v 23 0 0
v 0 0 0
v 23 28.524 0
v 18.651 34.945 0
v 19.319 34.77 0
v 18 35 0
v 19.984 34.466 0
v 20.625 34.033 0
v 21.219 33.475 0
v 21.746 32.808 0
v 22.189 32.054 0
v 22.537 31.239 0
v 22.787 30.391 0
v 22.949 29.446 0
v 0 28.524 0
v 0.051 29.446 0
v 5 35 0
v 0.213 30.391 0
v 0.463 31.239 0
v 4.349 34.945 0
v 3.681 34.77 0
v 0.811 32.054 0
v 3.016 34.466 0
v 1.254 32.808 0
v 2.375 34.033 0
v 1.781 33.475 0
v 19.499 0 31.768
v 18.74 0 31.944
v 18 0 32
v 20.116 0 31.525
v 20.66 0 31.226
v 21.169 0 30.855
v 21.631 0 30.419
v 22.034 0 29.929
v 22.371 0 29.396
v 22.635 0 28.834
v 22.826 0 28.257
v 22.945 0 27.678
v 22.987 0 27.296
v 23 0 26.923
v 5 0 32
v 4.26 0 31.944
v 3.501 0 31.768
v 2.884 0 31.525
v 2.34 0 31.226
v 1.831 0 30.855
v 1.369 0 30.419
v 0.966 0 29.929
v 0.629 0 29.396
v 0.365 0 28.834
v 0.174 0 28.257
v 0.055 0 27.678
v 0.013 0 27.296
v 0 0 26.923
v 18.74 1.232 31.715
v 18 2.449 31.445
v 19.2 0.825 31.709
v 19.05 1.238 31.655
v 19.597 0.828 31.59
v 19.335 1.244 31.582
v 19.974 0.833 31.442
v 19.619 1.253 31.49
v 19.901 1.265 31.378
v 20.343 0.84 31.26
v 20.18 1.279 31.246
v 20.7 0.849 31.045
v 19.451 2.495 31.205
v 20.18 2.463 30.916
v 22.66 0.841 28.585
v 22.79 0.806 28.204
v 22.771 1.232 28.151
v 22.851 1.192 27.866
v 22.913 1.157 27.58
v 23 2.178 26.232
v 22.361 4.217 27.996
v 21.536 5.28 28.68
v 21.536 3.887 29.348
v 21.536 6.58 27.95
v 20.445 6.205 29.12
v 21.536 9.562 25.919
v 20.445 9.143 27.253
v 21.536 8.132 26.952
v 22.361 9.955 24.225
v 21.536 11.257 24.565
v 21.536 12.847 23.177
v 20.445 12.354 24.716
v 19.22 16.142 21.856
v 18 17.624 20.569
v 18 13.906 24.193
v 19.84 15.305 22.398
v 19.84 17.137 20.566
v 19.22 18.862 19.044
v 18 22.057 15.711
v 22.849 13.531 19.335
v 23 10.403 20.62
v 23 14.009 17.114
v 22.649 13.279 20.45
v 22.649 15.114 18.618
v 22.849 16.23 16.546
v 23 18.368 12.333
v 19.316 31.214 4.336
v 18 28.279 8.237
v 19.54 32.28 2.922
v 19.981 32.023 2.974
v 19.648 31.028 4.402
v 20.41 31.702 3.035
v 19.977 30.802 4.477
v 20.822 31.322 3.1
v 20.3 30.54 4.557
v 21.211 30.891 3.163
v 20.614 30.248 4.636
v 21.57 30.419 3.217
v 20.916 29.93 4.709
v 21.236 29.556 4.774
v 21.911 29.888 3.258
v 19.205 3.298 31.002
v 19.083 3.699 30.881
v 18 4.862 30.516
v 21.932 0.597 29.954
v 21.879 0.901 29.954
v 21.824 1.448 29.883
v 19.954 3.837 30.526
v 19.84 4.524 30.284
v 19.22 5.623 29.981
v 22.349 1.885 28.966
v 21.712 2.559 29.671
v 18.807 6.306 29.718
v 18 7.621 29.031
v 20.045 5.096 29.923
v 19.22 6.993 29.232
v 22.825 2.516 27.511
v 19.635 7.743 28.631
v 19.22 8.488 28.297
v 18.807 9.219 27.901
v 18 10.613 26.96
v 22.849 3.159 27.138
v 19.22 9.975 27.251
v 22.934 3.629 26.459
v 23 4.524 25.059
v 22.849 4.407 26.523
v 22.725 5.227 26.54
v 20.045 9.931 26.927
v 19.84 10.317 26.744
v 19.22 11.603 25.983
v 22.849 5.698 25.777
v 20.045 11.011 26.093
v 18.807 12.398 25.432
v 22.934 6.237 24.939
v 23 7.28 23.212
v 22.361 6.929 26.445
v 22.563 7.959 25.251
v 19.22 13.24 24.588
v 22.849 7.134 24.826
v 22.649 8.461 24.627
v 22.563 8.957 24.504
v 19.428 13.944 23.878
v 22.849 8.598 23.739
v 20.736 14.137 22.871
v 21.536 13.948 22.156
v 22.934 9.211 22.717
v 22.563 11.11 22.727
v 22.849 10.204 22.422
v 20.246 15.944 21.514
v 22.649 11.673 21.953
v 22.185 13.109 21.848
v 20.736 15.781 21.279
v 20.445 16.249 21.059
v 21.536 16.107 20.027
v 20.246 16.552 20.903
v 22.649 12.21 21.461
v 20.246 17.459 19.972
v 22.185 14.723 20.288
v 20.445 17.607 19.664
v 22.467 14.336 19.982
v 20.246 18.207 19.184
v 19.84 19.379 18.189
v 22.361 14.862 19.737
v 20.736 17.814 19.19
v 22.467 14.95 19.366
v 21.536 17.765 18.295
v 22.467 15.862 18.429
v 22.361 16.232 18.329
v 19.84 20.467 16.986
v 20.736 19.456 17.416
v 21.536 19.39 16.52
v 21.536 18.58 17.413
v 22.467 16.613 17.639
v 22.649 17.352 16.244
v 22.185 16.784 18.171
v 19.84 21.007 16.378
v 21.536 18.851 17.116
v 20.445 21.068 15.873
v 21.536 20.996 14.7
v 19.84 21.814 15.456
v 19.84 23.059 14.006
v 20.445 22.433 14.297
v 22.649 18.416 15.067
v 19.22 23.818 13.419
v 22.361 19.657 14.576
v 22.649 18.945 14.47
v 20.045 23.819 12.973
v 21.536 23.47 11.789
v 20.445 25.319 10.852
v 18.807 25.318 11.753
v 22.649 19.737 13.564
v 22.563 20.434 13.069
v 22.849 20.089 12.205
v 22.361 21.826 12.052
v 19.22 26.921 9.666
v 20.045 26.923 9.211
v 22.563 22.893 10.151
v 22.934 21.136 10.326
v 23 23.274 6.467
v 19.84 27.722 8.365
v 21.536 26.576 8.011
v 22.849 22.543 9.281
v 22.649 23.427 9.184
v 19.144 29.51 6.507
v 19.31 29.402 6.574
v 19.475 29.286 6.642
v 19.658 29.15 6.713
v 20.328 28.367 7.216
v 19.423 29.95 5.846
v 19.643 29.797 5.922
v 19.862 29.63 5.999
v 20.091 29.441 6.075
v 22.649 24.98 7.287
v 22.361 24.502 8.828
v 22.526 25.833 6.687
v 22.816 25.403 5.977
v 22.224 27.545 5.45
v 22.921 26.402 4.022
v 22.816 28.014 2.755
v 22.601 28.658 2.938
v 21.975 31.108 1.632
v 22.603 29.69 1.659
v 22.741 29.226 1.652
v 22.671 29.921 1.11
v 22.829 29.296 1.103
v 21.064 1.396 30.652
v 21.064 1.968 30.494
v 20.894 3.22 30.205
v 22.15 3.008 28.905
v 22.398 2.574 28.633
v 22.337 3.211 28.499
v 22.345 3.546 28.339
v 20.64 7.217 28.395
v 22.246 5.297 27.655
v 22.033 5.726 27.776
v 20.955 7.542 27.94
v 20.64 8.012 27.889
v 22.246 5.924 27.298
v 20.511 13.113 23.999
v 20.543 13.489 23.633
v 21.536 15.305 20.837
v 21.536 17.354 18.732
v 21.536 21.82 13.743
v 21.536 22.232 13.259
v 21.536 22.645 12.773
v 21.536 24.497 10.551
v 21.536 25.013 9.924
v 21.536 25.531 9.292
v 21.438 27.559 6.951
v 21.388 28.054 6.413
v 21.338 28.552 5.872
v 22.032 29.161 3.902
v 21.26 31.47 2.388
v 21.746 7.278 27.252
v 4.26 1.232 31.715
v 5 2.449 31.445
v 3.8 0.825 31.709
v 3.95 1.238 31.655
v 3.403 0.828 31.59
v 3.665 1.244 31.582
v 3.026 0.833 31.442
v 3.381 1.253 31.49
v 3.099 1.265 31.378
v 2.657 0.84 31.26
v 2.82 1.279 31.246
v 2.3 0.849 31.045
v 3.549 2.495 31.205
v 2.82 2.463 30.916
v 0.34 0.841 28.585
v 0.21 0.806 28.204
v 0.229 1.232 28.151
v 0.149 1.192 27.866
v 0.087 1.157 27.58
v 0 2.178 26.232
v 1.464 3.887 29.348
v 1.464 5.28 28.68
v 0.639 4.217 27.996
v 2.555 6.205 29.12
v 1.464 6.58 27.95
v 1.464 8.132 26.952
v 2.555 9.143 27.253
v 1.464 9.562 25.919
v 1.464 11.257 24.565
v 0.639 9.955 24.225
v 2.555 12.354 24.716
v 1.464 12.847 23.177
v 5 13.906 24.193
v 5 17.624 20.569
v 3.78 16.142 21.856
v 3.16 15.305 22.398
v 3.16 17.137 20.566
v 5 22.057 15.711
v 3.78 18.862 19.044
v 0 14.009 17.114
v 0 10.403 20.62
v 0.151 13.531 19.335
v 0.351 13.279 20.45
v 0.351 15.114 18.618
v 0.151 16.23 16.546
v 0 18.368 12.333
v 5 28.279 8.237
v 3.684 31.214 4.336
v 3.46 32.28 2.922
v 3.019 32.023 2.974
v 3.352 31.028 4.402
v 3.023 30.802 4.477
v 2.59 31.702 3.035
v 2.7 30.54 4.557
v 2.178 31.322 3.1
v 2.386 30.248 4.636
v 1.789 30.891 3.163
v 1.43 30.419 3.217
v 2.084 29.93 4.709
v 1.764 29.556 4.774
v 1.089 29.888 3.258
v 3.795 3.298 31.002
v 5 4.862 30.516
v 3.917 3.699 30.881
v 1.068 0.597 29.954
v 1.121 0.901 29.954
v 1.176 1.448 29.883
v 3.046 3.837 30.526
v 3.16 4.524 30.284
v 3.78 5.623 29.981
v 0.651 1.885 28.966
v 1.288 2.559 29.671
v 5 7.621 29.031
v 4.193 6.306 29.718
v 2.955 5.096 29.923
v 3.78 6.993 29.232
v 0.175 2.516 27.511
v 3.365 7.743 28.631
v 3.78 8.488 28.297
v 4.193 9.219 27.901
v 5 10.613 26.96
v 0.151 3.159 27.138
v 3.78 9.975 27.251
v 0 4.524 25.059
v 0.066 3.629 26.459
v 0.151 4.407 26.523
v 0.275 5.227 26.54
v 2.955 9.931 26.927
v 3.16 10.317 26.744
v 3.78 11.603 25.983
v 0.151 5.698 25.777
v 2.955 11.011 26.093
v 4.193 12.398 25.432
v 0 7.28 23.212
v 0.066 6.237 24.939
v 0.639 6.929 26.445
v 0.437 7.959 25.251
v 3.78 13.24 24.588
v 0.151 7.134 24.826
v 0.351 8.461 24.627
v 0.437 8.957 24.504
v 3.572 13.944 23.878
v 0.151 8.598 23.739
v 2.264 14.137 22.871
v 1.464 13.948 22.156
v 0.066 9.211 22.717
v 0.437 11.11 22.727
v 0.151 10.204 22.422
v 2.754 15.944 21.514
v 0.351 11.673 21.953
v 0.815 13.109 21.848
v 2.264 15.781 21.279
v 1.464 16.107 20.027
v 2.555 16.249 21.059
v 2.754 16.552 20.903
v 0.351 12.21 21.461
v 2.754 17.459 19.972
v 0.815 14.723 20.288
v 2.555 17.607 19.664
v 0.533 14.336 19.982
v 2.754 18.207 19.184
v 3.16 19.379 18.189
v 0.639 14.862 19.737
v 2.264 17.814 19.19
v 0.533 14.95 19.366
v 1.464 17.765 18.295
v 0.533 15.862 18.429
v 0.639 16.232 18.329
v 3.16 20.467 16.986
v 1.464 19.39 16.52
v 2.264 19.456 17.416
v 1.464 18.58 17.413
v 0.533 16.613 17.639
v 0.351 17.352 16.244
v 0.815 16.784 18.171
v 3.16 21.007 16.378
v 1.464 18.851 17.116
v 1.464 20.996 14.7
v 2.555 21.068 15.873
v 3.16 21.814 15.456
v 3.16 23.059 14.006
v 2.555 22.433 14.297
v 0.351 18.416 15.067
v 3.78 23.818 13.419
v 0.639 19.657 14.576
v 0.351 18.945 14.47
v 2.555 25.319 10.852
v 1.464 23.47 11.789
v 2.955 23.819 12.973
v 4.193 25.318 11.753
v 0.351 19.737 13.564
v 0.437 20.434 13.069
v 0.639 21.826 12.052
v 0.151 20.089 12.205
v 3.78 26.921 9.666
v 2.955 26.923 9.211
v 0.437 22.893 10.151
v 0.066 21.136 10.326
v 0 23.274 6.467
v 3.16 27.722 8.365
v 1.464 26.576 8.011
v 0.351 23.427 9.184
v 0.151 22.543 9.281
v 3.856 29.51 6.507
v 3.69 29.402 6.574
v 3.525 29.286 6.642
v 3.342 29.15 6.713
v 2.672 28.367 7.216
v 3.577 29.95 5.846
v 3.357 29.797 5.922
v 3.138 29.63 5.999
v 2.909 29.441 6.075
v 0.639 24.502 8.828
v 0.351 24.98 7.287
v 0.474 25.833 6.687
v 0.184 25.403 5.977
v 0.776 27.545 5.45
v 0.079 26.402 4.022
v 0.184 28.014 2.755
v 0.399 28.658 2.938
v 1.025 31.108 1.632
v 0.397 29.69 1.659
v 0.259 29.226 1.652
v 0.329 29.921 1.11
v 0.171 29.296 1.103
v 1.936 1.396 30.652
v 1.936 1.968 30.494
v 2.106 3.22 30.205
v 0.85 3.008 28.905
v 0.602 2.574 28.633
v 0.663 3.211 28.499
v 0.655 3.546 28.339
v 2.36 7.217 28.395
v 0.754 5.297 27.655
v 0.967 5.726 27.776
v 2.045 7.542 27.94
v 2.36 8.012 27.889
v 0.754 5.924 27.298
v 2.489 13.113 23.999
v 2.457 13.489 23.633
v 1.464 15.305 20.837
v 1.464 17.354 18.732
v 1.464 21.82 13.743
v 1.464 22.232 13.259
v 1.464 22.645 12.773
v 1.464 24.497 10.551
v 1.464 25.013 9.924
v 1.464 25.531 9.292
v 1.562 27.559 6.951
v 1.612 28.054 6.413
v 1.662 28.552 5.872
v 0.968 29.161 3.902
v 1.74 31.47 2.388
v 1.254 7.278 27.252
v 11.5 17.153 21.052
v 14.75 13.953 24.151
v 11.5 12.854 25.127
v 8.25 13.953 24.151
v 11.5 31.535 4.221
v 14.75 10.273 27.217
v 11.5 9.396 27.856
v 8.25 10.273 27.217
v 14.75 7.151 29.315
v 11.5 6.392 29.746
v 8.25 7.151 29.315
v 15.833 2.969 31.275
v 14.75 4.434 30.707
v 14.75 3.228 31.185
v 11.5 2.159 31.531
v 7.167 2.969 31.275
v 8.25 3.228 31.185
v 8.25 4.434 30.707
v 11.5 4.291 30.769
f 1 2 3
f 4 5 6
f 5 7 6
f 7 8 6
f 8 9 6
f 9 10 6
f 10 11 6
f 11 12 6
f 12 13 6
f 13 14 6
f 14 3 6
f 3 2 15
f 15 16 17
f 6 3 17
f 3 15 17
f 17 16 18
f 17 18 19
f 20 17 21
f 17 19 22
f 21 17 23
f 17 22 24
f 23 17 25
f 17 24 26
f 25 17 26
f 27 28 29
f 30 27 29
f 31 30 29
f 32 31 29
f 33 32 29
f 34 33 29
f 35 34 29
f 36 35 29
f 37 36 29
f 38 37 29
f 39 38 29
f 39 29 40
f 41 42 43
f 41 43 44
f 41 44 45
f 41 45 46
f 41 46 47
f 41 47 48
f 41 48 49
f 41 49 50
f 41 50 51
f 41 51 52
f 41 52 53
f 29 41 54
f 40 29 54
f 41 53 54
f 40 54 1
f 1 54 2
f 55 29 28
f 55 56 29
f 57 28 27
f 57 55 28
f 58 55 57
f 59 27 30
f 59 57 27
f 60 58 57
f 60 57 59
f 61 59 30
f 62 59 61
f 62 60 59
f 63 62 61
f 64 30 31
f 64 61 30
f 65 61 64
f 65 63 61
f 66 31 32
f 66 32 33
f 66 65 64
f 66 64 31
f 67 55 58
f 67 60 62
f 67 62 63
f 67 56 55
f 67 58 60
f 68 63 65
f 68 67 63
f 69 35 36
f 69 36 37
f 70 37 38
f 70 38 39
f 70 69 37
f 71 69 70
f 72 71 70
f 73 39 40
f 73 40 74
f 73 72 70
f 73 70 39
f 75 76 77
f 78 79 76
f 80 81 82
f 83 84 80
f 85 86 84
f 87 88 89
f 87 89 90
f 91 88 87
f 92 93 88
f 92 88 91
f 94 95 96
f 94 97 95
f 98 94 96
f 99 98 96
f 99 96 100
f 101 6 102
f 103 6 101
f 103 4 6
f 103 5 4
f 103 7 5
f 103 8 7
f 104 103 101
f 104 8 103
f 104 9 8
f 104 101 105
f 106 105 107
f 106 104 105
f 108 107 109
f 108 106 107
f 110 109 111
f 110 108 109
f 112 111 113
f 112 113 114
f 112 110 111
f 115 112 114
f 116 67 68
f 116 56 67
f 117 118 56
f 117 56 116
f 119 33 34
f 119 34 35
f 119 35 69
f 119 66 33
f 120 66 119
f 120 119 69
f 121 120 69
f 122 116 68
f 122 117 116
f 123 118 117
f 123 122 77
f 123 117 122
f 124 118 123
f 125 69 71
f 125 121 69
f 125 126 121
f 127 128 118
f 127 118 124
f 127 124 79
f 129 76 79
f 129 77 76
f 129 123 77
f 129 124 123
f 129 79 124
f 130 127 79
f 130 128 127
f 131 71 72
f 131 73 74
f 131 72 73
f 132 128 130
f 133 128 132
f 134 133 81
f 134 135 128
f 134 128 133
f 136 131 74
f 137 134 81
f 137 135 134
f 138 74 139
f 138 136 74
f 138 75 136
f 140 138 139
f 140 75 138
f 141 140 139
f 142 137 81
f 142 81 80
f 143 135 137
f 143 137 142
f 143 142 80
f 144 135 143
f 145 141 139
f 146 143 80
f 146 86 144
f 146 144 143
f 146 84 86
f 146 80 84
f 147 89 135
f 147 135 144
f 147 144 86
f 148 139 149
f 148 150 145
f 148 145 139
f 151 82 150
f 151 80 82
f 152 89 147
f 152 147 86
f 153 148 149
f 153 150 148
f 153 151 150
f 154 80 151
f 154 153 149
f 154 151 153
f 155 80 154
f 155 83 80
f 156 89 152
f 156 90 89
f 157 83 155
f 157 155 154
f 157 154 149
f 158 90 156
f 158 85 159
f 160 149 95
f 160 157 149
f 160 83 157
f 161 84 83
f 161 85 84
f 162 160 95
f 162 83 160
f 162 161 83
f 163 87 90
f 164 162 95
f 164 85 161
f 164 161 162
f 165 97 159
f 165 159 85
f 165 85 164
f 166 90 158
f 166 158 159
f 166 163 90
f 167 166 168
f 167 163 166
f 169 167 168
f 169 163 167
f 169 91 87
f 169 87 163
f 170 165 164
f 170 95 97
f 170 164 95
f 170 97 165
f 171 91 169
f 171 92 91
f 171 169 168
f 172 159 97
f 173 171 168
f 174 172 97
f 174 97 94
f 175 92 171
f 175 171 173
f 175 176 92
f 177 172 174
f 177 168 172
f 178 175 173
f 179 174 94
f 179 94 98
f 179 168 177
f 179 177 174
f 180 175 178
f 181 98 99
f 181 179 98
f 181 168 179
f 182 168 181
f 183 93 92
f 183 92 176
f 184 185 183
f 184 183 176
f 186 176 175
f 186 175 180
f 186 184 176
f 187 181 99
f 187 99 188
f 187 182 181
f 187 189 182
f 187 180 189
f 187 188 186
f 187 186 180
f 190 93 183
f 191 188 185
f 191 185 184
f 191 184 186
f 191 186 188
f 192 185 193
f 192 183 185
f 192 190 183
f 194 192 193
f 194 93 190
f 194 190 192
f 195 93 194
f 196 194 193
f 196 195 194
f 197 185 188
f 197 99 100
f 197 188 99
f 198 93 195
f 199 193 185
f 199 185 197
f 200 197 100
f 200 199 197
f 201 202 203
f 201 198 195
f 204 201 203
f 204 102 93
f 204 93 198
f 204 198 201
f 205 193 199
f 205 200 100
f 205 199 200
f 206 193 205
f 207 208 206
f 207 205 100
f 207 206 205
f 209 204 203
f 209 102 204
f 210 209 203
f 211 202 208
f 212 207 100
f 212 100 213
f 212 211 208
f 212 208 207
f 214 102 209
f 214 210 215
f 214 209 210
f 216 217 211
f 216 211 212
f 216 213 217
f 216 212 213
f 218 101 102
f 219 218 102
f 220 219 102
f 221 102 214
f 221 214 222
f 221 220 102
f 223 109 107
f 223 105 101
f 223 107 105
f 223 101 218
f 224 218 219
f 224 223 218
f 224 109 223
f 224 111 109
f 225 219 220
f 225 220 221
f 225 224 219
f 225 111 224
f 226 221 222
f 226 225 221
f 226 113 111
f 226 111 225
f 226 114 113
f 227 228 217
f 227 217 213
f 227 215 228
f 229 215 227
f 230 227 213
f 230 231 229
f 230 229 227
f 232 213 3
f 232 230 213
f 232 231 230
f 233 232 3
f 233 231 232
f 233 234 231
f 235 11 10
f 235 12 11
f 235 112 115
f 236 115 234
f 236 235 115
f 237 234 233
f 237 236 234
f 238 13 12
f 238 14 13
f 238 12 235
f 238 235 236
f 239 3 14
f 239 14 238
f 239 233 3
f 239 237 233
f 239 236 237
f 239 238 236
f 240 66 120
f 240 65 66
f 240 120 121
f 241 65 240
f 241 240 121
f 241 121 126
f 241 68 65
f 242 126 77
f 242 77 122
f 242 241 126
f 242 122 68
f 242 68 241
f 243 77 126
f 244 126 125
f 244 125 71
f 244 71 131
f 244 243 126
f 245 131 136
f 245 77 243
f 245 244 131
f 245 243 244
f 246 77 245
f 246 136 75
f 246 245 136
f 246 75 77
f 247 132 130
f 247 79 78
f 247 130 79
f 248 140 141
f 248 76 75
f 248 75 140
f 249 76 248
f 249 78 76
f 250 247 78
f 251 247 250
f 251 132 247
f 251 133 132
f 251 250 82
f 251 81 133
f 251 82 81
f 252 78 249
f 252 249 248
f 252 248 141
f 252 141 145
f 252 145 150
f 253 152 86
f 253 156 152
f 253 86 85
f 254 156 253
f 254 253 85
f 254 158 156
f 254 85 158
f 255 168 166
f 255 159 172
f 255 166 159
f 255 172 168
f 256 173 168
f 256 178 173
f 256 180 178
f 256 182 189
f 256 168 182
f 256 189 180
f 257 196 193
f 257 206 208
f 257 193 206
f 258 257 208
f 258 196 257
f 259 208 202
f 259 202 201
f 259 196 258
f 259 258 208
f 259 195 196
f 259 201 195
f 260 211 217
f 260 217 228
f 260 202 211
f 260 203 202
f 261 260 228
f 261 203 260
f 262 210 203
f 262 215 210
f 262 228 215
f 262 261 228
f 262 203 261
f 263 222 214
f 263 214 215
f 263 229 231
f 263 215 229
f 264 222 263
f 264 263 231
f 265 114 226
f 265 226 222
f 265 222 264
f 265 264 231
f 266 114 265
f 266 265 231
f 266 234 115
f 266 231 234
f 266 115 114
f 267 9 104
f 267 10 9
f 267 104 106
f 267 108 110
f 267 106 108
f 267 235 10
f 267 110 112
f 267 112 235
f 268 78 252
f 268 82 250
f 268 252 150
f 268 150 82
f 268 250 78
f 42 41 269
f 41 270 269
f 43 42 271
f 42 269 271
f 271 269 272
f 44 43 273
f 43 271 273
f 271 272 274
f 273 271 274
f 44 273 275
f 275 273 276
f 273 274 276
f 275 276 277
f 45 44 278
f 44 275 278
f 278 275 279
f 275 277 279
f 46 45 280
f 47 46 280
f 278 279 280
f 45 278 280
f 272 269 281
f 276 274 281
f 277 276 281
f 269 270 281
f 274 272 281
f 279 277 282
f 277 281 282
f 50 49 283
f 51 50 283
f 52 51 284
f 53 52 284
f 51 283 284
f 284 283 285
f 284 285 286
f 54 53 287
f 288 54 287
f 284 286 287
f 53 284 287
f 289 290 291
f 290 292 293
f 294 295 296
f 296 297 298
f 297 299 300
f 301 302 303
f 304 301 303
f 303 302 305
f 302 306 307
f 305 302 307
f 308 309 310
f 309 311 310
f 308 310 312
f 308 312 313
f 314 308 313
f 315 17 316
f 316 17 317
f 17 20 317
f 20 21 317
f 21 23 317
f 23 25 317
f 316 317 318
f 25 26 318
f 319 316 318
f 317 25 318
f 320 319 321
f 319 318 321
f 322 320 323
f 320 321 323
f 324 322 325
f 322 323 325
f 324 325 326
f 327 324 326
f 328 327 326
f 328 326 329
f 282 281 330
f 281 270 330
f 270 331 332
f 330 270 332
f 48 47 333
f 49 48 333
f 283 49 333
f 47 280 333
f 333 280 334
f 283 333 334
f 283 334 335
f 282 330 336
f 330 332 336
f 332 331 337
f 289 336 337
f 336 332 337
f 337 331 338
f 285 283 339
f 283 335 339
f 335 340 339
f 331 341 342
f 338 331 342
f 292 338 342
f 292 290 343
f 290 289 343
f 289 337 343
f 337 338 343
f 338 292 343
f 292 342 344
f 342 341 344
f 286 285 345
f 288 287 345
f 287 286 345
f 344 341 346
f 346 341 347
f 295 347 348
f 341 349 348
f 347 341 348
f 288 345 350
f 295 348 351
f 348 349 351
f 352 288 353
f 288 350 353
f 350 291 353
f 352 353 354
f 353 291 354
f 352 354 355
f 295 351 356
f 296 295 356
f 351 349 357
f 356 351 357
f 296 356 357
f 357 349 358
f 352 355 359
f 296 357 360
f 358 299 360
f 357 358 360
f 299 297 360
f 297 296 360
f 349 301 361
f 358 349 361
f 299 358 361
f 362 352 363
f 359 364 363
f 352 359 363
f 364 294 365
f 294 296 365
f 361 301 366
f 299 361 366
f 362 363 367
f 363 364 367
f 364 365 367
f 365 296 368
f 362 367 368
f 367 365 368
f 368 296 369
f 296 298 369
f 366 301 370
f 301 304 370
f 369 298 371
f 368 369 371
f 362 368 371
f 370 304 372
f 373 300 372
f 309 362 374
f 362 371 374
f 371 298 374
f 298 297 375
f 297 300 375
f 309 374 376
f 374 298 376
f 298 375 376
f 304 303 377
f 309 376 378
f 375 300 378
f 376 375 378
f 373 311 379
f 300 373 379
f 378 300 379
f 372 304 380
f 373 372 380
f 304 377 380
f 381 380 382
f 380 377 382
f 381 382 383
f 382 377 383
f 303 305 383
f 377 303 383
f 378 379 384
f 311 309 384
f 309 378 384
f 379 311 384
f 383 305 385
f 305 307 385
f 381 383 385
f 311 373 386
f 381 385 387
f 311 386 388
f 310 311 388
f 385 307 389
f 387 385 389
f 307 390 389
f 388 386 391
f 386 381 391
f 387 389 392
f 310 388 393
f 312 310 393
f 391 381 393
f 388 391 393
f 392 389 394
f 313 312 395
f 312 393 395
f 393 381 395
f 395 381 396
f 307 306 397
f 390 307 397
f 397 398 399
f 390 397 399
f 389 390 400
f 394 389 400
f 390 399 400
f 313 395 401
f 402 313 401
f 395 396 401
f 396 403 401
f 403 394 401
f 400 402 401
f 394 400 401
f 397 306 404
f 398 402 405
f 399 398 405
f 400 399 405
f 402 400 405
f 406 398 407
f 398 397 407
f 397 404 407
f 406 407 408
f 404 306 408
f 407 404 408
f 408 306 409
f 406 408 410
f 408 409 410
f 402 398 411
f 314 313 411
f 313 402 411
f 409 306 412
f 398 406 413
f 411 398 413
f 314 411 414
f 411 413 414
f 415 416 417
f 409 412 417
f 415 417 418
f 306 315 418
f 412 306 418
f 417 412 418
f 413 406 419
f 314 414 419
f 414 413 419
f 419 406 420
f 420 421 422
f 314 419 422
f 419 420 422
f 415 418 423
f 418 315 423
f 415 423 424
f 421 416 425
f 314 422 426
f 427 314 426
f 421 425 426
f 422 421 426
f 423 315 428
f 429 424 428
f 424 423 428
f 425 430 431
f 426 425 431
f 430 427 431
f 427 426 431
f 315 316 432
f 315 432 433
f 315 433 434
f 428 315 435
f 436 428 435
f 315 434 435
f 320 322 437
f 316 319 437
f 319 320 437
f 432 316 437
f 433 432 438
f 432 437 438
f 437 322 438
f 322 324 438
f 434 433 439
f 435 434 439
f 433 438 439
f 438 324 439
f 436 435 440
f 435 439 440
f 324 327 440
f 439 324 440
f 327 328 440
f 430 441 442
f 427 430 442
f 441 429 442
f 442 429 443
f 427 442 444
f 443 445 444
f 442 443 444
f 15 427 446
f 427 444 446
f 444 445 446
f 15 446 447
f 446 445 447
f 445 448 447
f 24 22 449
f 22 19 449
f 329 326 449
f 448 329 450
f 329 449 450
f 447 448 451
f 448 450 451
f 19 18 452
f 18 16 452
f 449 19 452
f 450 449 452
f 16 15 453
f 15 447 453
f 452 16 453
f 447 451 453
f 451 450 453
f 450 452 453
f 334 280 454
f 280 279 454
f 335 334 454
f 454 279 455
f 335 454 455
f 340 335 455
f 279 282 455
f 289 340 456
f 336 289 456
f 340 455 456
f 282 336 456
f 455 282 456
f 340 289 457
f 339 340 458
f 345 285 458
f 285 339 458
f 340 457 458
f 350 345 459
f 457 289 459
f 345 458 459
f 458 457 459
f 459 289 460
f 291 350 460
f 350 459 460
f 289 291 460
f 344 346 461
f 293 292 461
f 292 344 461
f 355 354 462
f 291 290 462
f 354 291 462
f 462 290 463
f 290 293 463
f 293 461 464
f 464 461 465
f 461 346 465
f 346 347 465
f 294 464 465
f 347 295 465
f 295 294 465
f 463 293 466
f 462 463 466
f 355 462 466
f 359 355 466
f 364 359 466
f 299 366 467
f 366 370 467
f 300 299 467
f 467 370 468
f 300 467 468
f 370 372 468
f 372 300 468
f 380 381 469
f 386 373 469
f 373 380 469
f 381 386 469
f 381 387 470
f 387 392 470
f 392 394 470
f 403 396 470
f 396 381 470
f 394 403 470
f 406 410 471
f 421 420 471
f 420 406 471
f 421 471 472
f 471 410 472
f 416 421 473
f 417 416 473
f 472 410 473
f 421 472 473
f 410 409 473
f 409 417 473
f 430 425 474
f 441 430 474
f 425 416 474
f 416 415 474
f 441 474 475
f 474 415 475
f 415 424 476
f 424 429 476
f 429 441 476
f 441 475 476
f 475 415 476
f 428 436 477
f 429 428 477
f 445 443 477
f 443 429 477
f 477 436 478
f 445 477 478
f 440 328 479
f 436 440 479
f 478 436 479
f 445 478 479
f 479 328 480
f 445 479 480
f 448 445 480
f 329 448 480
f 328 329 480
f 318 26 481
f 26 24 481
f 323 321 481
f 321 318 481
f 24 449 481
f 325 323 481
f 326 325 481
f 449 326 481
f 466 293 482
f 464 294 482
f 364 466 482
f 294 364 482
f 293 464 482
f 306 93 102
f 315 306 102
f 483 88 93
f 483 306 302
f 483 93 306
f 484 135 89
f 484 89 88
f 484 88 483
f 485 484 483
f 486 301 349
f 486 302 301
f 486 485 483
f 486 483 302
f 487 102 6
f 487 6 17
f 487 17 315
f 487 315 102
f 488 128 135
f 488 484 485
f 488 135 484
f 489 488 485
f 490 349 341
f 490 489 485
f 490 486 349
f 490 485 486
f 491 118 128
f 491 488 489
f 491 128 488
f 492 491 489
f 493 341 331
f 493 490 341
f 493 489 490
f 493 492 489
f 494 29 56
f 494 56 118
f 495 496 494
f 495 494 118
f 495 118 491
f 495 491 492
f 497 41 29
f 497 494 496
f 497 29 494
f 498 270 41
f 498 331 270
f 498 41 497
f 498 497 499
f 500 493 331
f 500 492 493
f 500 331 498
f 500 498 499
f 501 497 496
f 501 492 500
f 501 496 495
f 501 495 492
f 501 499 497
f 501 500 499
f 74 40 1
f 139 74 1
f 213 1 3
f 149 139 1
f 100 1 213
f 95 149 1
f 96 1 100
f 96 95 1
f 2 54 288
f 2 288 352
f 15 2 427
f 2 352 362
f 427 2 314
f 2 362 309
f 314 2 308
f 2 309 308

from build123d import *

# Parameters (mm, degrees)
F1_DEPTH = 23
F2_R     = 5


with BuildPart() as f1:
    # F0 (on Right) → F1 (new body)
    with BuildSketch(Plane.YZ):
        with BuildLine():
            Line((0, 32), (0, 0))
            Line((0, 0), (35, 0))
            add(Edge.make_bspline(
                [(0, 32), (6.1176732558, 31.1241345812), (18.7744410969, 20.7877141071), (28.3450948651, 8.007303629), (35, 0)],
                knots=[0, 0, 0, 0, 0.4619845032, 1, 1, 1, 1], degree=3))
        make_face()
    extrude(amount=F1_DEPTH)

    # F2
    f2_edges = [f1.edges().sort_by_distance(p)[0] for p in [
        (23, 19.530043, 18.544117),
        (0, 19.530043, 18.544117),
    ]]
    fillet(f2_edges, radius=F2_R)


solid = f1.part
